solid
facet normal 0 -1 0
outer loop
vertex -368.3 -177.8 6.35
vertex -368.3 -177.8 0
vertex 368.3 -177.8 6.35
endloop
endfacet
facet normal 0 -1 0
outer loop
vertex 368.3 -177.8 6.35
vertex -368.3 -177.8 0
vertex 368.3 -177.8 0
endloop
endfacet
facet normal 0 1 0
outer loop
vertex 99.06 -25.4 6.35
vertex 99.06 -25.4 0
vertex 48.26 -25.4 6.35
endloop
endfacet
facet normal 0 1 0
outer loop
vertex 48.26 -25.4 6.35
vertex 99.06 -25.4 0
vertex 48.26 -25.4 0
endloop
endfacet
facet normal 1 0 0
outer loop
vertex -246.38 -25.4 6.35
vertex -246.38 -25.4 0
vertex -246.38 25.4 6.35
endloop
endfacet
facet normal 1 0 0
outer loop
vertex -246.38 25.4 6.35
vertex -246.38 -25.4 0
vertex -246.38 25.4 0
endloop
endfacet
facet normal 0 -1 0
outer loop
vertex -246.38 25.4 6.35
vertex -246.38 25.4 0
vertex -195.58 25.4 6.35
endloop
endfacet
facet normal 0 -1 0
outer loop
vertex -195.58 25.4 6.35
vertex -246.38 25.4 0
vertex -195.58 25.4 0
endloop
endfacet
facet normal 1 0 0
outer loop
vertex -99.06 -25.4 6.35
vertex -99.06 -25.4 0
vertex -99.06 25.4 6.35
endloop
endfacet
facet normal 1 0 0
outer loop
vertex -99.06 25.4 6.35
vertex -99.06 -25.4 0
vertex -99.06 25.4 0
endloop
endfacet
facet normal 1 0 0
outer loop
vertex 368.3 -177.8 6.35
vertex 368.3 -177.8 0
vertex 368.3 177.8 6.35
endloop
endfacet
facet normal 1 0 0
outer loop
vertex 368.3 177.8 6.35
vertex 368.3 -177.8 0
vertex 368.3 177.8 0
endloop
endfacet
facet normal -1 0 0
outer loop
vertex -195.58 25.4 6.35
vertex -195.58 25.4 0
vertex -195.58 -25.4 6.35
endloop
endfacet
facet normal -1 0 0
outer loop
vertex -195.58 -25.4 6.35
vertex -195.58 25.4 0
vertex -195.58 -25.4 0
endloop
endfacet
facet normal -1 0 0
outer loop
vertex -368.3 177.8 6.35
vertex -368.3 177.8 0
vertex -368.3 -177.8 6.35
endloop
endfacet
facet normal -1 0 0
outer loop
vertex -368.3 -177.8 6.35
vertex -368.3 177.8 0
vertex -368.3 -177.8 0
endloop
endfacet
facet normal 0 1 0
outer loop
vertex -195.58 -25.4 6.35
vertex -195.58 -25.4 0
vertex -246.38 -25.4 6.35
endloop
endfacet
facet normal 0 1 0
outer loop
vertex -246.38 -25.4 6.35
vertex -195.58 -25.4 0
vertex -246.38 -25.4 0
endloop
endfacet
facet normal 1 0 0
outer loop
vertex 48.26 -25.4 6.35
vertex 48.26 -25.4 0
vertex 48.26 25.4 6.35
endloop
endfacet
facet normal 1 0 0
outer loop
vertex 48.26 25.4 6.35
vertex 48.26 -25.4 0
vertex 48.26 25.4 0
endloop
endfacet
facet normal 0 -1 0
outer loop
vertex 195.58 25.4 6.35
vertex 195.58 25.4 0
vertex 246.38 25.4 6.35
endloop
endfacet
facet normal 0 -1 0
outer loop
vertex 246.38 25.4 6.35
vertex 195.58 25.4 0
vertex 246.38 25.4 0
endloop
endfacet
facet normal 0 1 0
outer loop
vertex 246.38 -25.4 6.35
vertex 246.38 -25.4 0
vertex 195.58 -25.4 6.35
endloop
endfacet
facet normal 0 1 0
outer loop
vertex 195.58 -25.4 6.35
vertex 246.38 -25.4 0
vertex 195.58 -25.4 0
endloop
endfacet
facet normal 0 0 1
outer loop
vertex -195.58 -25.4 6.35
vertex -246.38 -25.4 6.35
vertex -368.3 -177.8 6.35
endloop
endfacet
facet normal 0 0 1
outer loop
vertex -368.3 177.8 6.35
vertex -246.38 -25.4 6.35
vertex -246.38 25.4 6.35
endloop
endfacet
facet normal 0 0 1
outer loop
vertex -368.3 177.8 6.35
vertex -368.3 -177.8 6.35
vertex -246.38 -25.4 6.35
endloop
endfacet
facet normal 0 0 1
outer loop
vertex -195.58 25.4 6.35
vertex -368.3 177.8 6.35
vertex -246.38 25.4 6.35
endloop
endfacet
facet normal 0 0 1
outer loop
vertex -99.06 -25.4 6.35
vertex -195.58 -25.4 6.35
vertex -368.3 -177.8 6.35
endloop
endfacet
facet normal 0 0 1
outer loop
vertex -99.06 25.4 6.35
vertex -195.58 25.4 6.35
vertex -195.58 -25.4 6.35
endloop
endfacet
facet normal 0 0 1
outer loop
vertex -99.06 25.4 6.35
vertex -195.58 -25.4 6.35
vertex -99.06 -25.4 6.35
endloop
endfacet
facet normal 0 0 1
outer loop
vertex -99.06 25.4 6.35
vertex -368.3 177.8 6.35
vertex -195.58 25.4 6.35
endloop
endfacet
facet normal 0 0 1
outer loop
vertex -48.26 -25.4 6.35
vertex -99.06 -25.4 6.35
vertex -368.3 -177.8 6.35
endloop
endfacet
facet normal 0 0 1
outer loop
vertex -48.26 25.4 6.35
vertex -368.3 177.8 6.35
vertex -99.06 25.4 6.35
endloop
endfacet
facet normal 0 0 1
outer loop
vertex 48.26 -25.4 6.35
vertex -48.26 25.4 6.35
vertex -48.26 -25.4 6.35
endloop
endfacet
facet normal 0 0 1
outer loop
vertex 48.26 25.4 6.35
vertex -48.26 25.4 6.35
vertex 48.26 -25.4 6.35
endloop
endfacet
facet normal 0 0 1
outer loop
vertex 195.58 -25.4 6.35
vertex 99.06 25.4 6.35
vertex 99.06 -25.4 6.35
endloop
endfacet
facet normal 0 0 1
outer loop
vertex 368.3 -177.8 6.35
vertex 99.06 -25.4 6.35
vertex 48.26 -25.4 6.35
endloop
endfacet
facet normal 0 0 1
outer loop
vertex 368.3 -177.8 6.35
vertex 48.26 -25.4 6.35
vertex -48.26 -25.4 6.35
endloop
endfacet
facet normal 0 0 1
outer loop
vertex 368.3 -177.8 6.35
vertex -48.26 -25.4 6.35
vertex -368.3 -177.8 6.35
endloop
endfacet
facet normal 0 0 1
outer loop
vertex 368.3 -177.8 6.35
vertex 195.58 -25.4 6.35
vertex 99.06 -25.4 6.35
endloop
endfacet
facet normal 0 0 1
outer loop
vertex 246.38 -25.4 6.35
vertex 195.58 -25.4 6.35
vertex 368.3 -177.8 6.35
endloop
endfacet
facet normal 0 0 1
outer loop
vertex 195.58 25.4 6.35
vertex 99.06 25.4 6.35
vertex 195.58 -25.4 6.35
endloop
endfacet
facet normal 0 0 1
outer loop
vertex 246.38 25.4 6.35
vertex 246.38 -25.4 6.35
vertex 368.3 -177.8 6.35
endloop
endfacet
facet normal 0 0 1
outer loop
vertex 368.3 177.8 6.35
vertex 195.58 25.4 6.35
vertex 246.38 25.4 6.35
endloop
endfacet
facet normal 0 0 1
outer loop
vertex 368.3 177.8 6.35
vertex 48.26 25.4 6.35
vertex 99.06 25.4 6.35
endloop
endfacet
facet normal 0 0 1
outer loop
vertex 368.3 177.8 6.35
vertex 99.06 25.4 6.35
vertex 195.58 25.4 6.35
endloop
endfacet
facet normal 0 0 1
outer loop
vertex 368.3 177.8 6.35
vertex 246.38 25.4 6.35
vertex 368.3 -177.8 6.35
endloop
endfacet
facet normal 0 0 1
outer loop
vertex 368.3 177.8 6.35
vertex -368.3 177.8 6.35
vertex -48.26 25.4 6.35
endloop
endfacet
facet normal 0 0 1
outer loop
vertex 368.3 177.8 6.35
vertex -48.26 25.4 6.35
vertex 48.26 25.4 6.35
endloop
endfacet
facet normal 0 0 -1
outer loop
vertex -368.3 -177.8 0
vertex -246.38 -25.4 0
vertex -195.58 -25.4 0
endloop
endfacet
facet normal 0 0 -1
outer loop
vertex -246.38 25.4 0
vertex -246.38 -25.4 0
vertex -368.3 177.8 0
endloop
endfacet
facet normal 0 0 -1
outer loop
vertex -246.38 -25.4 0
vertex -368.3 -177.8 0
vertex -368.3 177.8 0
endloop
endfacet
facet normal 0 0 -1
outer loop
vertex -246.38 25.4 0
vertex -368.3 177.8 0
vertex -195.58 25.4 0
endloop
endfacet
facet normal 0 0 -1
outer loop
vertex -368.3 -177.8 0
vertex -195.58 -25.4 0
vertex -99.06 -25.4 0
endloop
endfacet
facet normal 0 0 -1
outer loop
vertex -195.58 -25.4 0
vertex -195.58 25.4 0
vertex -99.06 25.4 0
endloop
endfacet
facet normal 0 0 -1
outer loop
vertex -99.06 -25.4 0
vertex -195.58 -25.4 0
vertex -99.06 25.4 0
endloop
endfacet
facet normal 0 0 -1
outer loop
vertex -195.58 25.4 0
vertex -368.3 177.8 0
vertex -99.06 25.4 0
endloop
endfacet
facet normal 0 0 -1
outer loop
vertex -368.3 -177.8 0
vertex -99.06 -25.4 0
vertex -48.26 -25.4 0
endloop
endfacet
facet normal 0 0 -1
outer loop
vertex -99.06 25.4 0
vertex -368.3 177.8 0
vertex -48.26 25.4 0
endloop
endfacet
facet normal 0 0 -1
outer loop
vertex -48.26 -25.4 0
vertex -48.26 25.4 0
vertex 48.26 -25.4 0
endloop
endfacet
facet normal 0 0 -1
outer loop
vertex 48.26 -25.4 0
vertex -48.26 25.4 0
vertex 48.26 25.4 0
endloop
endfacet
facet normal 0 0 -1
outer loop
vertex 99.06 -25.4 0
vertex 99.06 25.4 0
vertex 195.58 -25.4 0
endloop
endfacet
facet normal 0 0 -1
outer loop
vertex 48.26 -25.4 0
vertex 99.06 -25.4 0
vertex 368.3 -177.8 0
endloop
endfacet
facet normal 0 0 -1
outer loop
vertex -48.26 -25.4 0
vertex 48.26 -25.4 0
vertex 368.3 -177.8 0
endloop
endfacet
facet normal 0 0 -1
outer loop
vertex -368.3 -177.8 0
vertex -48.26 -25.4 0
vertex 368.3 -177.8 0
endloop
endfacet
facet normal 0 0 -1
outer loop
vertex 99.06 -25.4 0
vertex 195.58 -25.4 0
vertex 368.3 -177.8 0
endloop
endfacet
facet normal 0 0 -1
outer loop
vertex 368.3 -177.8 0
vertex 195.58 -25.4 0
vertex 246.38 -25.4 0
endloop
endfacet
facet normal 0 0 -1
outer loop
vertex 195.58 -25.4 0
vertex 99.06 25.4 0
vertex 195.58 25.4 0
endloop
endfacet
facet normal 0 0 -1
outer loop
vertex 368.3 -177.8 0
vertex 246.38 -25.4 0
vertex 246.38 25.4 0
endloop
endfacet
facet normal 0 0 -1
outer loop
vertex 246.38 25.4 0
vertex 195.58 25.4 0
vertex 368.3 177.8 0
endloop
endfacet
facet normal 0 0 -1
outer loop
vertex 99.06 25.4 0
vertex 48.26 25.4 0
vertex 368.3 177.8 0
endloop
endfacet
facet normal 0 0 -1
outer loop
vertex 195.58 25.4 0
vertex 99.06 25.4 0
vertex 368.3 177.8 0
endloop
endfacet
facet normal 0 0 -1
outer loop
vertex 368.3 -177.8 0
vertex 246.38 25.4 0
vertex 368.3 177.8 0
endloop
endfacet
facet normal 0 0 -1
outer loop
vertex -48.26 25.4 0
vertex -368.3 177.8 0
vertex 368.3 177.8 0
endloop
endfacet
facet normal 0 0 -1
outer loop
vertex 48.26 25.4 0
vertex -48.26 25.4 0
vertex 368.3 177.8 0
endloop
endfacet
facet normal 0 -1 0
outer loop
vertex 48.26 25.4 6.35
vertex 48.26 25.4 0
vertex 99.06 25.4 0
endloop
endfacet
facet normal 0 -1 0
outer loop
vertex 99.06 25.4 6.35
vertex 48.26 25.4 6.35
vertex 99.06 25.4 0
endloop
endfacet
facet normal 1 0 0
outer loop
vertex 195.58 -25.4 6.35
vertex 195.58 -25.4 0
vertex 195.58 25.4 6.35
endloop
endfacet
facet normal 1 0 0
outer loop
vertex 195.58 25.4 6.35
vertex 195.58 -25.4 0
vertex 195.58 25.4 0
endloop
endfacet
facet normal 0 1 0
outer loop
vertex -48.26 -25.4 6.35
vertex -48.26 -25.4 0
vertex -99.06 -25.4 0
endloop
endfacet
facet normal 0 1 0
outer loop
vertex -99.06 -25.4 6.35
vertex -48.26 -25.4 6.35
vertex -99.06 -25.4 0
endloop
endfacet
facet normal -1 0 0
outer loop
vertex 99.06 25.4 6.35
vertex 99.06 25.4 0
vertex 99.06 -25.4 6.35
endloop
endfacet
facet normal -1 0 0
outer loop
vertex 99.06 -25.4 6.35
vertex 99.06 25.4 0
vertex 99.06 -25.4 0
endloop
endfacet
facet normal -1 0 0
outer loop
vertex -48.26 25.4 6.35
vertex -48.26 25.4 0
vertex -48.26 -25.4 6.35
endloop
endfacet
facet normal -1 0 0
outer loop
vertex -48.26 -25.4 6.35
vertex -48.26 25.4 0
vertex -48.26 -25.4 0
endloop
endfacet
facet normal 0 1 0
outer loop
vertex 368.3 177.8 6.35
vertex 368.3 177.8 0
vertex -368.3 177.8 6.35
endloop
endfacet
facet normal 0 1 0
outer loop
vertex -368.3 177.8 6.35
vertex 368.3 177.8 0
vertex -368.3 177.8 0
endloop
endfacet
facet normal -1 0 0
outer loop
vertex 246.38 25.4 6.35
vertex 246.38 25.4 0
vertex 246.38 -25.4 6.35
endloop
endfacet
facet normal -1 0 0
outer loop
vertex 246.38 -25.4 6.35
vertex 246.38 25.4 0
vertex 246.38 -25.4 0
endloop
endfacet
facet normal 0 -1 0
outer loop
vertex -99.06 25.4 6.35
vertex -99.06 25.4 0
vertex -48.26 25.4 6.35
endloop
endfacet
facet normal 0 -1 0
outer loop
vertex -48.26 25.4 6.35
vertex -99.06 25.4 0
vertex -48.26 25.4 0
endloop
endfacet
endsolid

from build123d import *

# Parameters (mm, degrees)
F1_DEPTH = 6.35


with BuildPart() as f1:
    # F0 (on Top) → F1 (new body)
    with BuildSketch(Plane.XY):
        Polygon((-368.3, -177.8), (368.3, -177.8), (368.3, 0), (246.38, 0), (246.38, -25.4), (195.58, -25.4), (195.58, 0), (99.06, 0), (99.06, -25.4), (48.26, -25.4), (48.26, 0), (-48.26, 0), (-48.26, -25.4), (-99.06, -25.4), (-99.06, 0), (-195.58, 0), (-195.58, -25.4), (-246.38, -25.4), (-246.38, 0), (-368.3, 0), align=None)
        Polygon((246.38, 0), (368.3, 0), (368.3, 177.8), (-368.3, 177.8), (-368.3, 0), (-246.38, 0), (-246.38, 25.4), (-195.58, 25.4), (-195.58, 0), (-99.06, 0), (-99.06, 25.4), (-48.26, 25.4), (-48.26, 0), (48.26, 0), (48.26, 25.4), (99.06, 25.4), (99.06, 0), (195.58, 0), (195.58, 25.4), (246.38, 25.4), align=None)
    extrude(amount=F1_DEPTH)


solid = f1.part
